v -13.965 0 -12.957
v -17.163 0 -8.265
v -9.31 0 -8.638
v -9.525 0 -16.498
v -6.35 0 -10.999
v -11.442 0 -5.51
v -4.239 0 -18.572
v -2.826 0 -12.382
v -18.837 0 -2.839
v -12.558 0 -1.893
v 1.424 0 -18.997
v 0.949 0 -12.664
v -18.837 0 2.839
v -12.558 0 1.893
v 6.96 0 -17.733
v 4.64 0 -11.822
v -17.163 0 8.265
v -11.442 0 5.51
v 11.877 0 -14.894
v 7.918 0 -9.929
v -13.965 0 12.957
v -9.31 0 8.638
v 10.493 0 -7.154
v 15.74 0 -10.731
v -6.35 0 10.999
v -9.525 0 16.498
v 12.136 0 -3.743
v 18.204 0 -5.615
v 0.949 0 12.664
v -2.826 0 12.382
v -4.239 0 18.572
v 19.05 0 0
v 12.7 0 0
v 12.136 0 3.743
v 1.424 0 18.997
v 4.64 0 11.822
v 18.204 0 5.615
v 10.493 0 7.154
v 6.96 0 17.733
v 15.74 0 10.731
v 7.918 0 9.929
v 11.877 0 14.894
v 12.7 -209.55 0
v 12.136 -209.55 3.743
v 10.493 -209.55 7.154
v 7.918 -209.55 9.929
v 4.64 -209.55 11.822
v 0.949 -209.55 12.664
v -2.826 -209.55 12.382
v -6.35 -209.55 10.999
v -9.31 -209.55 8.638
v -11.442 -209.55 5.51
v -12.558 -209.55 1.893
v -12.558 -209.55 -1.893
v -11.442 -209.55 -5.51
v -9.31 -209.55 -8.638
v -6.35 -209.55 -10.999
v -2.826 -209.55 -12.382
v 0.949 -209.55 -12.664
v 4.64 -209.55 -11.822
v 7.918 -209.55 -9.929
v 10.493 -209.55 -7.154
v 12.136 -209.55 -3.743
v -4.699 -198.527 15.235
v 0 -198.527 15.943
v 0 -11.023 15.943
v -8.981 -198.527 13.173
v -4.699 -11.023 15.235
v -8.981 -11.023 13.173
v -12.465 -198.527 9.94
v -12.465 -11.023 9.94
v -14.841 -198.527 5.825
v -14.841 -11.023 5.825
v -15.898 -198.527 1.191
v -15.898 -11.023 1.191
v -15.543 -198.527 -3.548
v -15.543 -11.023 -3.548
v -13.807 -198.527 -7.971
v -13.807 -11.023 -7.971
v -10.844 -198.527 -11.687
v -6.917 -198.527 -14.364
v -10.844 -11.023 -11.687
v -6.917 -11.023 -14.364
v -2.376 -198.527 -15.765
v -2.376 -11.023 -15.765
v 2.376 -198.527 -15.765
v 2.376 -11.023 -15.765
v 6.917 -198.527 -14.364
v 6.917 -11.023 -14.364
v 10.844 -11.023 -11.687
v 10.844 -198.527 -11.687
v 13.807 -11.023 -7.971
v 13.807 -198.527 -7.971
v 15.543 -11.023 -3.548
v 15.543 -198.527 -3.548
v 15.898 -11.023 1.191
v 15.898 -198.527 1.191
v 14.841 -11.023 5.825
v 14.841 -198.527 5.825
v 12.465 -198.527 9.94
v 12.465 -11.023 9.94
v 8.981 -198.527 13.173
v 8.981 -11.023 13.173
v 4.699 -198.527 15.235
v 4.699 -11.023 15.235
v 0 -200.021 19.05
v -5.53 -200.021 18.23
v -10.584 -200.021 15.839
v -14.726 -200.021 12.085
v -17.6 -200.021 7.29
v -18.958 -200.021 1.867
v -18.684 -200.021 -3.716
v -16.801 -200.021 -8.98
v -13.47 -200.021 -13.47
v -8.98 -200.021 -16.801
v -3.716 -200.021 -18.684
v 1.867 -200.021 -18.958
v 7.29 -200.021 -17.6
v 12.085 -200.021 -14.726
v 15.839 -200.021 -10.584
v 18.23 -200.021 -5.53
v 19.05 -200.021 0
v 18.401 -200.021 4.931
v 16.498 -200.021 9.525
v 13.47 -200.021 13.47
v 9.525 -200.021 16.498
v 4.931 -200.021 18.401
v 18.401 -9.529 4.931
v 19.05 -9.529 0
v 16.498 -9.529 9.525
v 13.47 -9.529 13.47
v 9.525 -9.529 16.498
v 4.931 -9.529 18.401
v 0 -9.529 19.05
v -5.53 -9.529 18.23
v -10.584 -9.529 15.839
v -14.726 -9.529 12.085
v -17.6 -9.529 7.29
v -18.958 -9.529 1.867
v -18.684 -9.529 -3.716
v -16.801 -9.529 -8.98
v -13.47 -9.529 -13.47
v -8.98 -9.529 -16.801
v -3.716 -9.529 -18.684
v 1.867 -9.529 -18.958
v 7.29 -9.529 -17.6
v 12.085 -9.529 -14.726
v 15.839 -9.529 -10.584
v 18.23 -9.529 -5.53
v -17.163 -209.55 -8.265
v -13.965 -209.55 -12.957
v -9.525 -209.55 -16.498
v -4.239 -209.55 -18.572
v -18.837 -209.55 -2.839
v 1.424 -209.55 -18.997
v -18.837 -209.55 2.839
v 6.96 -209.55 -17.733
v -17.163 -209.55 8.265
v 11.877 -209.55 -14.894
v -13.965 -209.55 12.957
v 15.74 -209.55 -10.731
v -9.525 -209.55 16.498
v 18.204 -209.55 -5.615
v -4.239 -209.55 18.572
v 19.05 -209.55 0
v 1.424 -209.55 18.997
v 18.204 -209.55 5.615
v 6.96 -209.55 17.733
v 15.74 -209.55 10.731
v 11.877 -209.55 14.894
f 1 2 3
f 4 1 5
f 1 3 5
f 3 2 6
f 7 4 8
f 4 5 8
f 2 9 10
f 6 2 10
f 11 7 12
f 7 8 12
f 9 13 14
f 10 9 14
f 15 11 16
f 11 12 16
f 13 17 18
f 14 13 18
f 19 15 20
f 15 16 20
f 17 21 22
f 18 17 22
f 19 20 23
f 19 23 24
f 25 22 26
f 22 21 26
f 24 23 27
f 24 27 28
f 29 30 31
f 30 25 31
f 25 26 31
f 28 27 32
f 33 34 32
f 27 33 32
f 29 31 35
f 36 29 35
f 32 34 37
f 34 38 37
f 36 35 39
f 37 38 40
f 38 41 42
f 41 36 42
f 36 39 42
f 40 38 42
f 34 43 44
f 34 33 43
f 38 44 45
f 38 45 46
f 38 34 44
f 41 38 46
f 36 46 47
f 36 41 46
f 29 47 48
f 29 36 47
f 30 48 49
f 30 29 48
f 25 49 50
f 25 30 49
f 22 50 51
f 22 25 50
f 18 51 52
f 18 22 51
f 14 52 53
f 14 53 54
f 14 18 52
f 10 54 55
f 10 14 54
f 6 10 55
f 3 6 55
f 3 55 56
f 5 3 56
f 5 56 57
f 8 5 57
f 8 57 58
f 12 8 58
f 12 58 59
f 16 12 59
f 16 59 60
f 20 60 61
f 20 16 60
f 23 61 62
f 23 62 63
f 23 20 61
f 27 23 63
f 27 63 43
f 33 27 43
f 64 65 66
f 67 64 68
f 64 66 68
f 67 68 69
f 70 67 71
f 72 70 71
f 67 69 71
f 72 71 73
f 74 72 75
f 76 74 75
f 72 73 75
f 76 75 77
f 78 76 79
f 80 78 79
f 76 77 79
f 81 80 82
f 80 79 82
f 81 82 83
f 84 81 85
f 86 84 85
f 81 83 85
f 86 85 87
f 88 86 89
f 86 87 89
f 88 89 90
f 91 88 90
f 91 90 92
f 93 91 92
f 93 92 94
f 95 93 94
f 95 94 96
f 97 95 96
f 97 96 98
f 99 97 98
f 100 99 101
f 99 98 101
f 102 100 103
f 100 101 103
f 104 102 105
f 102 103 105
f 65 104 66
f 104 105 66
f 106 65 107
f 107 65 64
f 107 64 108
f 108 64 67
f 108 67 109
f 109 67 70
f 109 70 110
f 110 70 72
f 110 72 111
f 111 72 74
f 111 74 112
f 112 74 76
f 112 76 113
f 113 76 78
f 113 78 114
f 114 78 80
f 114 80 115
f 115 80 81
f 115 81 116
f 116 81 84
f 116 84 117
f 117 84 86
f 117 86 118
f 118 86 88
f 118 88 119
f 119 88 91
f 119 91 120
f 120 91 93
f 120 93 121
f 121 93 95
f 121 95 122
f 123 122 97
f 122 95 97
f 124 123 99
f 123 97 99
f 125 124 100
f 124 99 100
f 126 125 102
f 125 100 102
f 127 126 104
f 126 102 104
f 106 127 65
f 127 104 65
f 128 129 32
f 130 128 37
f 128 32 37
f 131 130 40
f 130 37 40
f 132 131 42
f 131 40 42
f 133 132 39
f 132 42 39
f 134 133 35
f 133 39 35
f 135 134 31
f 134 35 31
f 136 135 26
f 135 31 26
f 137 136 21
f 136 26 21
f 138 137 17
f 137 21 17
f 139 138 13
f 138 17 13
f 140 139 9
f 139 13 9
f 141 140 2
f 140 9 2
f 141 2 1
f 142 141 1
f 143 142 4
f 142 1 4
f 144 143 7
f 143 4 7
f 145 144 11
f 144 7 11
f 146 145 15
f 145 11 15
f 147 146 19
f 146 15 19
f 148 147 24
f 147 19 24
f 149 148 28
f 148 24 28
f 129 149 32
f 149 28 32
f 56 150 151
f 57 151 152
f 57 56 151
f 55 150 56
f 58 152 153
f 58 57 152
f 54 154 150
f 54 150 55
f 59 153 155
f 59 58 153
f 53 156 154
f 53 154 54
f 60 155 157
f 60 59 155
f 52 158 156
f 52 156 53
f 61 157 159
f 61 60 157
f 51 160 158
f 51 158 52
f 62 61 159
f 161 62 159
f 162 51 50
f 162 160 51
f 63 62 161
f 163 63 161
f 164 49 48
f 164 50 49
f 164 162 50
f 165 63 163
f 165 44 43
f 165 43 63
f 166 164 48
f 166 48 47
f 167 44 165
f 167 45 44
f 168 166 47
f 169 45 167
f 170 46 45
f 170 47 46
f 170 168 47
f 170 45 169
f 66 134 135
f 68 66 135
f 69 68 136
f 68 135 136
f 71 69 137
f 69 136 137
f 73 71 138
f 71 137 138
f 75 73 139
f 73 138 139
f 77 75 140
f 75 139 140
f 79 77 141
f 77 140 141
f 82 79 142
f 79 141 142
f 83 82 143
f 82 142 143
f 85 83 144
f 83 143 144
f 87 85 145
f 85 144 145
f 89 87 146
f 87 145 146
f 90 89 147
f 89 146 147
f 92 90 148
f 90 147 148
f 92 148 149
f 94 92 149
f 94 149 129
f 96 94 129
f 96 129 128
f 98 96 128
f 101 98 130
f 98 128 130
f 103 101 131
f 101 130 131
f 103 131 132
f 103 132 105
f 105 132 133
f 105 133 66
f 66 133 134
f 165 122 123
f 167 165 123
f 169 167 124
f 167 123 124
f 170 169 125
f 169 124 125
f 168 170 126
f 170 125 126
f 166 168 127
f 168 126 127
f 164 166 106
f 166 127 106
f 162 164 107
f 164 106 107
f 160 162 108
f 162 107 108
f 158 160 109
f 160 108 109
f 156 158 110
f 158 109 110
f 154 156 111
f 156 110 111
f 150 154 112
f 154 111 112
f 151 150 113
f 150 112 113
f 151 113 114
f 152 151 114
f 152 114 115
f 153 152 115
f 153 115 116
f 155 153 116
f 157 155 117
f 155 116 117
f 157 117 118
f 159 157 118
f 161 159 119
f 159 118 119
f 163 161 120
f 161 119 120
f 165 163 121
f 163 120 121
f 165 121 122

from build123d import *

# Parameters (mm, degrees)
F0_R     = 19.05
F0_R_2   = 12.7
F1_DEPTH = 152.4
F2_DEPTH = 57.15


with BuildPart() as f1:
    # F0 (on Front) → F1 (new body)
    with BuildSketch(Plane.XZ):
        Circle(F0_R)
        Circle(F0_R_2, mode=Mode.SUBTRACT)
    extrude(amount=F1_DEPTH)

    # F2 (add): a face of the model
    f2_faces = [f1.faces().sort_by_distance(p)[0] for p in [
        (-18.5111846327, -152.4, 0),
    ]]
    extrude(f2_faces, amount=F2_DEPTH)

    # F3 (on Right) → F4 (revolve, cut)
    with BuildSketch(Plane.YZ):
        Polygon((-11.023053821, 15.9428958603), (-6.3529792242, 25.6566461176), (-203.1970207758, 25.6566461176), (-198.526946179, 15.9428958603), align=None)
    revolve(axis=Axis((0, -209.55, 0), (0, -1, 0)), mode=Mode.SUBTRACT)


solid = f1.part
